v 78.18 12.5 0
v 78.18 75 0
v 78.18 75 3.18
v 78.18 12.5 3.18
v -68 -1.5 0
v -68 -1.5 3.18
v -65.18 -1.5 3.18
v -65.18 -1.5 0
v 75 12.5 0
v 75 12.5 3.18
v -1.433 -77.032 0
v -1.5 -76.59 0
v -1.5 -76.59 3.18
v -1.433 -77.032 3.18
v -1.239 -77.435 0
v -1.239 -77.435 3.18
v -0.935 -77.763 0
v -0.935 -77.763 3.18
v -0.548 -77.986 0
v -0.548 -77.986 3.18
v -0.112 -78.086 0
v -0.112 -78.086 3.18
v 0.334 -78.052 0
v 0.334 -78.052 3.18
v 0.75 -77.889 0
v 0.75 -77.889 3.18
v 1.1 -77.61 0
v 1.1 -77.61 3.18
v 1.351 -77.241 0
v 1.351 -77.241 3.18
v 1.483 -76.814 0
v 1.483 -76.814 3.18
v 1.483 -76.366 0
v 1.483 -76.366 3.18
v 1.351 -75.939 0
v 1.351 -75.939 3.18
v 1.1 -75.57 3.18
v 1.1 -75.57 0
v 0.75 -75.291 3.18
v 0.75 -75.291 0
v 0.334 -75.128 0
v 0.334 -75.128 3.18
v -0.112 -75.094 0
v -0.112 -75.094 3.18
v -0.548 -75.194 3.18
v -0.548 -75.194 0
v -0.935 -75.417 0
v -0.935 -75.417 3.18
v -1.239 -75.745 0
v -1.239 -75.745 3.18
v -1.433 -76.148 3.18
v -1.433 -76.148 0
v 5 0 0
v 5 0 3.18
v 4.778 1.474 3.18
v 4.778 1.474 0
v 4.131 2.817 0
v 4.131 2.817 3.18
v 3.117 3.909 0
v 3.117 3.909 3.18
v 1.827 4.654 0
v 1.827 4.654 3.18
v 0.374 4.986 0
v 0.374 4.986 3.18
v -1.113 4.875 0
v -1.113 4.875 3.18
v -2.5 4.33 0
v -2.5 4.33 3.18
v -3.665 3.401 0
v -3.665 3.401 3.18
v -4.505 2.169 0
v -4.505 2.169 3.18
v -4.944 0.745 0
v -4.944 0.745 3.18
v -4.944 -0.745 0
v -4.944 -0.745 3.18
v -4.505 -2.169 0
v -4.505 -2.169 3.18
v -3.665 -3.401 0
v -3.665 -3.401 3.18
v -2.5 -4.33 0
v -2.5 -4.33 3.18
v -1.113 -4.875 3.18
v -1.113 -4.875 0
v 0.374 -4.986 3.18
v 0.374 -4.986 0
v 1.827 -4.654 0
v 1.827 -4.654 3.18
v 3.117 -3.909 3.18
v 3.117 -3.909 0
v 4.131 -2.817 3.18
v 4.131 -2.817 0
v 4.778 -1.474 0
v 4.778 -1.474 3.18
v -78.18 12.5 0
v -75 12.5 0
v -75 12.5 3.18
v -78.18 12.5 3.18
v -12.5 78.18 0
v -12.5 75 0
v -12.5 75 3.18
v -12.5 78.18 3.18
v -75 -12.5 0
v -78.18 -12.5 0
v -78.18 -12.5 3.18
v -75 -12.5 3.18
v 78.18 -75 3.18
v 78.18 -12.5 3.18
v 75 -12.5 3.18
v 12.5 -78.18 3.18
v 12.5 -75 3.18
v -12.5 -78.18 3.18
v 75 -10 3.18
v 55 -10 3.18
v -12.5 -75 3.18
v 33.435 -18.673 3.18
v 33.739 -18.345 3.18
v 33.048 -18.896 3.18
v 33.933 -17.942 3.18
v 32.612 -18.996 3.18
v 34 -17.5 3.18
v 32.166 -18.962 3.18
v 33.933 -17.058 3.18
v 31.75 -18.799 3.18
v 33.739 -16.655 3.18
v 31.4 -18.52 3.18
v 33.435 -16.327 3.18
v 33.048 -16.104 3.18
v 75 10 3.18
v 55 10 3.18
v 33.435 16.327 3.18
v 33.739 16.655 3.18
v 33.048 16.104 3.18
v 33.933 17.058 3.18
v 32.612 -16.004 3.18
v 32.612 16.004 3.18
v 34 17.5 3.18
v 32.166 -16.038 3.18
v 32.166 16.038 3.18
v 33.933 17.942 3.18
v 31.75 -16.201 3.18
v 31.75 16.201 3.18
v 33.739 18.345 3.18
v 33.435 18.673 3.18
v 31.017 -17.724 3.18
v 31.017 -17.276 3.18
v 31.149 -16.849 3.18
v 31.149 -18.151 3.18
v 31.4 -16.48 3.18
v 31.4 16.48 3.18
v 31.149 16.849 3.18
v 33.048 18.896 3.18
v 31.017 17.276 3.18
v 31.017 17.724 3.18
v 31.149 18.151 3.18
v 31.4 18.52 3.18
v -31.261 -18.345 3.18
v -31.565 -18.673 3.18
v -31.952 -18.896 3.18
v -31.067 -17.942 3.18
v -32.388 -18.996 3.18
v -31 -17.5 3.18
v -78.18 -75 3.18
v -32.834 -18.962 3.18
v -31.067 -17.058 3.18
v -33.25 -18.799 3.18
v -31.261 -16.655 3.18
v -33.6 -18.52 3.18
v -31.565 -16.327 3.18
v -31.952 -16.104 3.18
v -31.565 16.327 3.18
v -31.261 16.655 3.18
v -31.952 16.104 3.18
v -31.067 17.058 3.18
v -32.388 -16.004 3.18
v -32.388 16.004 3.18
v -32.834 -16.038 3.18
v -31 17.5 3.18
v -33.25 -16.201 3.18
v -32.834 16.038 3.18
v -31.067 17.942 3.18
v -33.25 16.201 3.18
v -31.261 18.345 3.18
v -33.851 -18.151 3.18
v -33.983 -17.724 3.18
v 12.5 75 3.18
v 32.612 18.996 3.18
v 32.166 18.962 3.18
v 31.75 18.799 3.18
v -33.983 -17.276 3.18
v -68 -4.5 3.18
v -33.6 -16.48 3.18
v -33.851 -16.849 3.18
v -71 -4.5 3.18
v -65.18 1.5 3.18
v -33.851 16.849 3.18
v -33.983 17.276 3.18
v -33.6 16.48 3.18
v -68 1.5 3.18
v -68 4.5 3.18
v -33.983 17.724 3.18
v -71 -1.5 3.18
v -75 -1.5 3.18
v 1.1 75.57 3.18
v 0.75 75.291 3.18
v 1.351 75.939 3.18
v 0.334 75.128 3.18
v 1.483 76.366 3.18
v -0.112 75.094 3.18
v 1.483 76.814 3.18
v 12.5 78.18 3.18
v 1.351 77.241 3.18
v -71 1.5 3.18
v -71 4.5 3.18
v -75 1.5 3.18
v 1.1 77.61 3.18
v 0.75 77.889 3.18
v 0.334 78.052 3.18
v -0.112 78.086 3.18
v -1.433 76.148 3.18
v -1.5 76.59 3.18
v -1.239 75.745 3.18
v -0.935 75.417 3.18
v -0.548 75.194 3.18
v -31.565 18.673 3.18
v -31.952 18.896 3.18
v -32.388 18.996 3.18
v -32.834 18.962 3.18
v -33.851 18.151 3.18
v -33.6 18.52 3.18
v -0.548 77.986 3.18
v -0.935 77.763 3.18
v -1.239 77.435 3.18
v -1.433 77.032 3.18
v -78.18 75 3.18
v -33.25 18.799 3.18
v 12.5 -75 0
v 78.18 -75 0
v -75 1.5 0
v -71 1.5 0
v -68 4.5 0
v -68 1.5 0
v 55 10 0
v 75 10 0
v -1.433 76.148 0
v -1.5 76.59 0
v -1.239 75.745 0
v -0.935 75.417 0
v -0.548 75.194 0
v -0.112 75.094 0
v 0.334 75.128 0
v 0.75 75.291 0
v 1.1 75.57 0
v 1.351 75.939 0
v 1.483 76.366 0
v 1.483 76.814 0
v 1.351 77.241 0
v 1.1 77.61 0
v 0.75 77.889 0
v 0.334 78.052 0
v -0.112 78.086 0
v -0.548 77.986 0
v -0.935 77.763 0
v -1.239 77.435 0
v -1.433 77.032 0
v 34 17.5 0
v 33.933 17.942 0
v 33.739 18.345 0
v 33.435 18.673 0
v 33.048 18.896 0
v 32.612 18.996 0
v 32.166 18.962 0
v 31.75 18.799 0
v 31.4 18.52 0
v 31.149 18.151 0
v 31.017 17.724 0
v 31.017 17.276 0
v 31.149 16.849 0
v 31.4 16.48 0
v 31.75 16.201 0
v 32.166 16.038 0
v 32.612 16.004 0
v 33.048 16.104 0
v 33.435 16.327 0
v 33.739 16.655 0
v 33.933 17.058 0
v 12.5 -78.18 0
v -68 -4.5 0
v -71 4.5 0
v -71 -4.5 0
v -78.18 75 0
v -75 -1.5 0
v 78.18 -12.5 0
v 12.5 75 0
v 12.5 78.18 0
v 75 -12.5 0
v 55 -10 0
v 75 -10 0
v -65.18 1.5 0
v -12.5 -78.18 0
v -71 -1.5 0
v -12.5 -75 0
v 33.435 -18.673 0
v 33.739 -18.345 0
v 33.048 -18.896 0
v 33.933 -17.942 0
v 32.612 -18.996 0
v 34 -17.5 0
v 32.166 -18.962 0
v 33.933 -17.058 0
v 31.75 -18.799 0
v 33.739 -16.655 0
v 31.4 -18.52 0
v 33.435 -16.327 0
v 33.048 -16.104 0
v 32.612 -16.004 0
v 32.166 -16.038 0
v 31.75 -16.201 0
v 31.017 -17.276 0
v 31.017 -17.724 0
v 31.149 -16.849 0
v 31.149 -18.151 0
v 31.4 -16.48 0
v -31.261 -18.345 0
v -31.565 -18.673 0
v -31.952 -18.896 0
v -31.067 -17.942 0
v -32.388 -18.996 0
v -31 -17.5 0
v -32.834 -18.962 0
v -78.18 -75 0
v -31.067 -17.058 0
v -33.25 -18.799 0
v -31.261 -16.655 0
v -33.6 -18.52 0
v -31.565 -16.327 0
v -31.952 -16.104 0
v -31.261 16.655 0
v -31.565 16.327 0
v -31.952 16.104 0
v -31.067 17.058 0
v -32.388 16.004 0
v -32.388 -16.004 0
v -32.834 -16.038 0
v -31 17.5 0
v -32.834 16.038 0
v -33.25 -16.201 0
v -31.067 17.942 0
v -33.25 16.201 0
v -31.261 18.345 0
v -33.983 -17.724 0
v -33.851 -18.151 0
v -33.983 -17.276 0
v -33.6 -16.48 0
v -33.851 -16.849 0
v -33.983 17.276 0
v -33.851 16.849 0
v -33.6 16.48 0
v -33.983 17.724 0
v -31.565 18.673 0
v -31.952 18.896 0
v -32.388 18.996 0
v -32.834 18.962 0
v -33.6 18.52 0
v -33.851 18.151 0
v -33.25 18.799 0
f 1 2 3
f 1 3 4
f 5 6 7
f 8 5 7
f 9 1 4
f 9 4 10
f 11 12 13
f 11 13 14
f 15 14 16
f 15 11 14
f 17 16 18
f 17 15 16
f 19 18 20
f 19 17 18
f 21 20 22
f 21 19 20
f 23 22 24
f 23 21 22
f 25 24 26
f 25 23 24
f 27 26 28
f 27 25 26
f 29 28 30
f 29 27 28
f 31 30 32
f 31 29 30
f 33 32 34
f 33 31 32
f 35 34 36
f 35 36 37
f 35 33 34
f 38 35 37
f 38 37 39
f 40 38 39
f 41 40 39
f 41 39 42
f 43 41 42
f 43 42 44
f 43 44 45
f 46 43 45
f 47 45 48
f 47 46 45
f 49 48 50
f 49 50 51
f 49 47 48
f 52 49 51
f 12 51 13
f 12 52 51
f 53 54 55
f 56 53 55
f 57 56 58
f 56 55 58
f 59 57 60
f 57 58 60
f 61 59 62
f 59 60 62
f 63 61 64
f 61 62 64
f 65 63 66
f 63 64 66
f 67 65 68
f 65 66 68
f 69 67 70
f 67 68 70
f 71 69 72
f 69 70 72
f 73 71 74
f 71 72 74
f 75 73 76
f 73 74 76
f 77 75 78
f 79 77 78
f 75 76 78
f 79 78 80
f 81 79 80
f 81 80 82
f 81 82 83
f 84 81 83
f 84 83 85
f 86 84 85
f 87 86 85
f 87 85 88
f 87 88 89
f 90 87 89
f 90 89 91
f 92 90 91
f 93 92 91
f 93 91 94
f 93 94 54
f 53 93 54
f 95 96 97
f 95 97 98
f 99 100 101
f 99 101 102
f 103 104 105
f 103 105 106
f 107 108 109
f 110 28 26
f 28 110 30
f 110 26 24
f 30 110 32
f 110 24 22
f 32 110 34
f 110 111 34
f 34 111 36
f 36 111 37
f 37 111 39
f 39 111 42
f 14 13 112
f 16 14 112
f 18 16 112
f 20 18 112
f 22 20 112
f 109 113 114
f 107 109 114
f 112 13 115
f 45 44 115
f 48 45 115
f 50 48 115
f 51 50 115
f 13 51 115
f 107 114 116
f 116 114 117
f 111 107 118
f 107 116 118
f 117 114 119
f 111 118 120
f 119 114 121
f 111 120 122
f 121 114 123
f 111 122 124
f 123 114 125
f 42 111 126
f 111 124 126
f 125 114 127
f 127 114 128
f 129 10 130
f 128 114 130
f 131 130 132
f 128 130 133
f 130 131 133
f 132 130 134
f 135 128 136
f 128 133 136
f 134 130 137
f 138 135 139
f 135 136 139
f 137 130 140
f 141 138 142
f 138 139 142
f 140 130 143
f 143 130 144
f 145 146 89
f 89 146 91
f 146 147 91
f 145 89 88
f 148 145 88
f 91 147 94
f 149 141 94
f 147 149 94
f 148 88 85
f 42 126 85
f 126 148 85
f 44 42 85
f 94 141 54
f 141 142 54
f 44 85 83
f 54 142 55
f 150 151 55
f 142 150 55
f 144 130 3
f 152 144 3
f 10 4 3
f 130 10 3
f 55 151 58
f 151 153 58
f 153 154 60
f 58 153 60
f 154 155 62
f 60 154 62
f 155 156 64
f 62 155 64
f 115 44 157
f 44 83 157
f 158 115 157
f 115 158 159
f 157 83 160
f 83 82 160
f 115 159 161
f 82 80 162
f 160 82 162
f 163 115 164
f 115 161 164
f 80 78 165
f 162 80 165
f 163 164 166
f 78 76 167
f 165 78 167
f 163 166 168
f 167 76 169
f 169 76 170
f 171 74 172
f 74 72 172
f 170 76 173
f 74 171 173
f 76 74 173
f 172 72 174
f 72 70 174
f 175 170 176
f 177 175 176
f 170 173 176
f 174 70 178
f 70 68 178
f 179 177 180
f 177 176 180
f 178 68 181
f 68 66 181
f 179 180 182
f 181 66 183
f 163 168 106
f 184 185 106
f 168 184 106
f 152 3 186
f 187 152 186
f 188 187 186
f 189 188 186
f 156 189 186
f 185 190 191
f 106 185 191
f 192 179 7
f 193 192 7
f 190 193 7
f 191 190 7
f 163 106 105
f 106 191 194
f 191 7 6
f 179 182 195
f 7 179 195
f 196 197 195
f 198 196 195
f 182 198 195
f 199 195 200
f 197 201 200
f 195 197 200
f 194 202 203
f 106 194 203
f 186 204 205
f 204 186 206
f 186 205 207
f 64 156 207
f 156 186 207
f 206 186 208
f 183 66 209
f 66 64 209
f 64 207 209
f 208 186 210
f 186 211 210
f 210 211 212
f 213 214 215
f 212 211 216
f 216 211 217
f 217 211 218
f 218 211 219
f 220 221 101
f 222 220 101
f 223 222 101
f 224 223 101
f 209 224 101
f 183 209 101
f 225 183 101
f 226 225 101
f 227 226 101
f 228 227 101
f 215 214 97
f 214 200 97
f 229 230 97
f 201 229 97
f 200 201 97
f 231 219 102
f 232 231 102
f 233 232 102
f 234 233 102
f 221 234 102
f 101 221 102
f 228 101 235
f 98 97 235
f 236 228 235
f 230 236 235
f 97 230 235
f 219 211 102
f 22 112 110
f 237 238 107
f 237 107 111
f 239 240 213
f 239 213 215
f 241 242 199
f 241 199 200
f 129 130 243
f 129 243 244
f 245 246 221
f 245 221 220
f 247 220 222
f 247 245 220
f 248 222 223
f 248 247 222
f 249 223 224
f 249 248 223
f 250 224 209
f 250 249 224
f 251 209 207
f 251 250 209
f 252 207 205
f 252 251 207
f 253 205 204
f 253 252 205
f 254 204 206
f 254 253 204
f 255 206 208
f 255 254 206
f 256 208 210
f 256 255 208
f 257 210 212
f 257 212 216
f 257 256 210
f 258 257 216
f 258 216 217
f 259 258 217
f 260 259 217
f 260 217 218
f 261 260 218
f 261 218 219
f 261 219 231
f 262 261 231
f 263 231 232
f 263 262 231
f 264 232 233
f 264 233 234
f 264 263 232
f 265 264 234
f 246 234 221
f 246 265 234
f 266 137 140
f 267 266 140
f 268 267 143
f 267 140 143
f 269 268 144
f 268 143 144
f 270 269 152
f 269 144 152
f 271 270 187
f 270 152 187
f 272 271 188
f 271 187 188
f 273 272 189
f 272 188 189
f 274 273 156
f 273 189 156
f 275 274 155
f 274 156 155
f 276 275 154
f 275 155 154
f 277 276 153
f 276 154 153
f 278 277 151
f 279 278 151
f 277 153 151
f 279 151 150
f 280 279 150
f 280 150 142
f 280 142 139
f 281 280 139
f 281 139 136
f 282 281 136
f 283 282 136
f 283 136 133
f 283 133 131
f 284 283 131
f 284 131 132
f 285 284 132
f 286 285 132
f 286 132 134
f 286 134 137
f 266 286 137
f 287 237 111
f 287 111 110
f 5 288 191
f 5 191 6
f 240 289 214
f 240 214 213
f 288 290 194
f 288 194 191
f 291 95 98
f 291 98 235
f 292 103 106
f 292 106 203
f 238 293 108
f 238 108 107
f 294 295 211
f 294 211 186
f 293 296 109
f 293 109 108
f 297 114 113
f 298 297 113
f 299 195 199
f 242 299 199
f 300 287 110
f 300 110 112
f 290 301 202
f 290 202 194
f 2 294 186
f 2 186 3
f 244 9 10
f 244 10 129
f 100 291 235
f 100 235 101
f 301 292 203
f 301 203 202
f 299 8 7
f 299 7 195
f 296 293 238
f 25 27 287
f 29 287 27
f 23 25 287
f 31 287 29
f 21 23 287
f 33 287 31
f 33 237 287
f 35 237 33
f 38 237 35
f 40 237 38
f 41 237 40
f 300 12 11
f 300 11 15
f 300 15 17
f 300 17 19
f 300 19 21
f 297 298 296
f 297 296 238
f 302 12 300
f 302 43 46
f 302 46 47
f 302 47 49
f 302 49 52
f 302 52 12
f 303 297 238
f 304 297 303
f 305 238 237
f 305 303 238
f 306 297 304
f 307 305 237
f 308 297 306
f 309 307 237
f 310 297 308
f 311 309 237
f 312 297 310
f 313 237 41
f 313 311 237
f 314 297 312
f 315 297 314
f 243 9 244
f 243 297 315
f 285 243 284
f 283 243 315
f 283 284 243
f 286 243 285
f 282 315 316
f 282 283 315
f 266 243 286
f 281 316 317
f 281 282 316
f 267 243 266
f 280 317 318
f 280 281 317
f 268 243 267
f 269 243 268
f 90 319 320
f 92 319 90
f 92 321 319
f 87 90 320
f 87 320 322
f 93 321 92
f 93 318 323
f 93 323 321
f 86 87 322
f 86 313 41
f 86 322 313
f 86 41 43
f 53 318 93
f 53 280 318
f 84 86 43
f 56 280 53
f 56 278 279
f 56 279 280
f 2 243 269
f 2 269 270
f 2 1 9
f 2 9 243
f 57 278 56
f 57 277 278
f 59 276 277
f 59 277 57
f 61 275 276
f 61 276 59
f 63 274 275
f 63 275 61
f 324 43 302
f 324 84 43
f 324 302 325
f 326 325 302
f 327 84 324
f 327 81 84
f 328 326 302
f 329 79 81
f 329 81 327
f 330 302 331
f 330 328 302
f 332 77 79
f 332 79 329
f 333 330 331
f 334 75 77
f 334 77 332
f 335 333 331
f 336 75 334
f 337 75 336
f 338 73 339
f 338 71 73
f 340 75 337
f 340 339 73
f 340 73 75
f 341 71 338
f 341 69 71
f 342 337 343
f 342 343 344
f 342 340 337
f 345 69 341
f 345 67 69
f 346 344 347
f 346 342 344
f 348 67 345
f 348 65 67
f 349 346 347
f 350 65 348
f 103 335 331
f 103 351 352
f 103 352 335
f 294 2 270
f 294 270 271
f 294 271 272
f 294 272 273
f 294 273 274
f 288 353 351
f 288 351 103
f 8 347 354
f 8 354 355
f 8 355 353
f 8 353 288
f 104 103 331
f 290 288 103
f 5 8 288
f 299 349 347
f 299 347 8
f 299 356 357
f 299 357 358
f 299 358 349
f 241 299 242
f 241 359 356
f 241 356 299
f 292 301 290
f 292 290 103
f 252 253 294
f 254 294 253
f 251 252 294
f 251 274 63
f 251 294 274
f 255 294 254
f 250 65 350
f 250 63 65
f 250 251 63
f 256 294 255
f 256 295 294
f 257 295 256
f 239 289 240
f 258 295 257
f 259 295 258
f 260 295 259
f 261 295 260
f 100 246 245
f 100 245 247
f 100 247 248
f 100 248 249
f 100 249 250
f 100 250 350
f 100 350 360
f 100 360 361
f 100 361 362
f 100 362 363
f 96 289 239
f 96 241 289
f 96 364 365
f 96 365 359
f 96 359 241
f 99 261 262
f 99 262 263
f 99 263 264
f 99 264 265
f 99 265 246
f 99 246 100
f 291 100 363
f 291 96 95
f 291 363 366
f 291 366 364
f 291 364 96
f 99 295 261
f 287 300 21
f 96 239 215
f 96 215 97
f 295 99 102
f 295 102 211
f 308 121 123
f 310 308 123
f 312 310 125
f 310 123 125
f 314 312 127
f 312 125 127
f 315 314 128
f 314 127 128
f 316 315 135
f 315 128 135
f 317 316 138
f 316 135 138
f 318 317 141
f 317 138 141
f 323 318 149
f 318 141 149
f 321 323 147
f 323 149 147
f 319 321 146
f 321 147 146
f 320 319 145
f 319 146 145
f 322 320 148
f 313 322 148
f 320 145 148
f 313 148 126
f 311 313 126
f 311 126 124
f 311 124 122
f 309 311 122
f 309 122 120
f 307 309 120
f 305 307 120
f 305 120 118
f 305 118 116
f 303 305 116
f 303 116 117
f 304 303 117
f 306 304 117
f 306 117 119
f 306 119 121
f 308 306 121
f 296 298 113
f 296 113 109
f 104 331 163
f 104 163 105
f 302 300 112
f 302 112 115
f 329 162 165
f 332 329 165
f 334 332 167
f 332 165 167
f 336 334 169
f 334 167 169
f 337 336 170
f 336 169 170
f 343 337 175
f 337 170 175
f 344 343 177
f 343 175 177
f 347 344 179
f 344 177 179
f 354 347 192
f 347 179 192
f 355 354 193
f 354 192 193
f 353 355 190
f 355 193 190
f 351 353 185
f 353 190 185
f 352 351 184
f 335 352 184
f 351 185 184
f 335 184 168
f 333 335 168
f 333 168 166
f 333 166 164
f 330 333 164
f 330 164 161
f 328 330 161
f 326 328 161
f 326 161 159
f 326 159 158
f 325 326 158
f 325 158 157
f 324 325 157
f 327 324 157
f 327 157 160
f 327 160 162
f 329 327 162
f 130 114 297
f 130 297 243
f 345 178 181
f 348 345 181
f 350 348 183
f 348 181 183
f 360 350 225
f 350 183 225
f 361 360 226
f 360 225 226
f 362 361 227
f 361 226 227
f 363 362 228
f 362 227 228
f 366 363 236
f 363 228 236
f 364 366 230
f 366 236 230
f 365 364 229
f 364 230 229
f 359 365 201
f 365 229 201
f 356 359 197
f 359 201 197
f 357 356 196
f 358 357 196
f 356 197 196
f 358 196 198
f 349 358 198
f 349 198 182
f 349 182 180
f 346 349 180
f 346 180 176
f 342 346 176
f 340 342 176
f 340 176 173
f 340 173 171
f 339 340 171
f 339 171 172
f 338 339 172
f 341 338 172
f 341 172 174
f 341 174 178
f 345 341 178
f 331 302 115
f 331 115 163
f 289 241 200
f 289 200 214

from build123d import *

# Parameters (mm, degrees)
SKETCH1_R           = 1.5
BOSS_EXTRUDE1_DEPTH = 3.18
SKETCH2_R           = 1.5
CUT_EXTRUDE1_DEPTH  = 10
SKETCH3_R           = 5
CUT_EXTRUDE2_DEPTH  = 10
SKETCH4_W           = 20
SKETCH4_H           = 20
CUT_EXTRUDE3_DEPTH  = 10


with BuildPart() as part:
    # Sketch1 → Boss-Extrude1 (new body)
    with BuildSketch(Plane.XY):
        Polygon((-78.18, 75), (-12.5, 75), (-12.5, 78.18), (12.5, 78.18), (12.5, 75), (78.18, 75), (78.18, 12.5), (75, 12.5), (75, 1.5), (71, 1.5), (71, 4.5), (68, 4.5), (68, 1.5), (65.18, 1.5), (65.18, -1.5), (68, -1.5), (68, -4.5), (71, -4.5), (71, -1.5), (75, -1.5), (75, -12.5), (78.18, -12.5), (78.18, -75), (12.5, -75), (12.5, -78.18), (-12.5, -78.18), (-12.5, -75), (-78.18, -75), (-78.18, -12.5), (-75, -12.5), (-75, -1.5), (-71, -1.5), (-71, -4.5), (-68, -4.5), (-68, -1.5), (-65.18, -1.5), (-65.18, 1.5), (-68, 1.5), (-68, 4.5), (-71, 4.5), (-71, 1.5), (-75, 1.5), (-75, 12.5), (-78.18, 12.5), align=None)
        with Locations(Location((0, -76.59, 0), (0, 0, 180))):
            Circle(SKETCH1_R, mode=Mode.SUBTRACT)
        with Locations(Location((0, 76.59, 0), (0, 0, 180))):
            Circle(SKETCH1_R, mode=Mode.SUBTRACT)
    extrude(amount=BOSS_EXTRUDE1_DEPTH)

    # Sketch2 → Cut-Extrude1 (cut)
    with BuildSketch(Plane.XY.offset(3.18)):
        with Locations((32.5, 17.5)):
            Circle(SKETCH2_R)
        with Locations((32.5, -17.5)):
            Circle(SKETCH2_R)
        with Locations((-32.5, 17.5)):
            Circle(SKETCH2_R)
        with Locations((-32.5, -17.5)):
            Circle(SKETCH2_R)
    extrude(amount=-CUT_EXTRUDE1_DEPTH, mode=Mode.SUBTRACT)

    # Sketch3 → Cut-Extrude2 (cut)
    with BuildSketch(Plane.XY.offset(3.18)):
        Circle(SKETCH3_R)
    extrude(amount=-CUT_EXTRUDE2_DEPTH, mode=Mode.SUBTRACT)

    # Sketch4 → Cut-Extrude3 (cut)
    with BuildSketch(Plane.XY.offset(3.18)):
        with Locations((65, 0)):
            Rectangle(SKETCH4_W, SKETCH4_H)
    extrude(amount=-CUT_EXTRUDE3_DEPTH, mode=Mode.SUBTRACT)


solid = part.part
